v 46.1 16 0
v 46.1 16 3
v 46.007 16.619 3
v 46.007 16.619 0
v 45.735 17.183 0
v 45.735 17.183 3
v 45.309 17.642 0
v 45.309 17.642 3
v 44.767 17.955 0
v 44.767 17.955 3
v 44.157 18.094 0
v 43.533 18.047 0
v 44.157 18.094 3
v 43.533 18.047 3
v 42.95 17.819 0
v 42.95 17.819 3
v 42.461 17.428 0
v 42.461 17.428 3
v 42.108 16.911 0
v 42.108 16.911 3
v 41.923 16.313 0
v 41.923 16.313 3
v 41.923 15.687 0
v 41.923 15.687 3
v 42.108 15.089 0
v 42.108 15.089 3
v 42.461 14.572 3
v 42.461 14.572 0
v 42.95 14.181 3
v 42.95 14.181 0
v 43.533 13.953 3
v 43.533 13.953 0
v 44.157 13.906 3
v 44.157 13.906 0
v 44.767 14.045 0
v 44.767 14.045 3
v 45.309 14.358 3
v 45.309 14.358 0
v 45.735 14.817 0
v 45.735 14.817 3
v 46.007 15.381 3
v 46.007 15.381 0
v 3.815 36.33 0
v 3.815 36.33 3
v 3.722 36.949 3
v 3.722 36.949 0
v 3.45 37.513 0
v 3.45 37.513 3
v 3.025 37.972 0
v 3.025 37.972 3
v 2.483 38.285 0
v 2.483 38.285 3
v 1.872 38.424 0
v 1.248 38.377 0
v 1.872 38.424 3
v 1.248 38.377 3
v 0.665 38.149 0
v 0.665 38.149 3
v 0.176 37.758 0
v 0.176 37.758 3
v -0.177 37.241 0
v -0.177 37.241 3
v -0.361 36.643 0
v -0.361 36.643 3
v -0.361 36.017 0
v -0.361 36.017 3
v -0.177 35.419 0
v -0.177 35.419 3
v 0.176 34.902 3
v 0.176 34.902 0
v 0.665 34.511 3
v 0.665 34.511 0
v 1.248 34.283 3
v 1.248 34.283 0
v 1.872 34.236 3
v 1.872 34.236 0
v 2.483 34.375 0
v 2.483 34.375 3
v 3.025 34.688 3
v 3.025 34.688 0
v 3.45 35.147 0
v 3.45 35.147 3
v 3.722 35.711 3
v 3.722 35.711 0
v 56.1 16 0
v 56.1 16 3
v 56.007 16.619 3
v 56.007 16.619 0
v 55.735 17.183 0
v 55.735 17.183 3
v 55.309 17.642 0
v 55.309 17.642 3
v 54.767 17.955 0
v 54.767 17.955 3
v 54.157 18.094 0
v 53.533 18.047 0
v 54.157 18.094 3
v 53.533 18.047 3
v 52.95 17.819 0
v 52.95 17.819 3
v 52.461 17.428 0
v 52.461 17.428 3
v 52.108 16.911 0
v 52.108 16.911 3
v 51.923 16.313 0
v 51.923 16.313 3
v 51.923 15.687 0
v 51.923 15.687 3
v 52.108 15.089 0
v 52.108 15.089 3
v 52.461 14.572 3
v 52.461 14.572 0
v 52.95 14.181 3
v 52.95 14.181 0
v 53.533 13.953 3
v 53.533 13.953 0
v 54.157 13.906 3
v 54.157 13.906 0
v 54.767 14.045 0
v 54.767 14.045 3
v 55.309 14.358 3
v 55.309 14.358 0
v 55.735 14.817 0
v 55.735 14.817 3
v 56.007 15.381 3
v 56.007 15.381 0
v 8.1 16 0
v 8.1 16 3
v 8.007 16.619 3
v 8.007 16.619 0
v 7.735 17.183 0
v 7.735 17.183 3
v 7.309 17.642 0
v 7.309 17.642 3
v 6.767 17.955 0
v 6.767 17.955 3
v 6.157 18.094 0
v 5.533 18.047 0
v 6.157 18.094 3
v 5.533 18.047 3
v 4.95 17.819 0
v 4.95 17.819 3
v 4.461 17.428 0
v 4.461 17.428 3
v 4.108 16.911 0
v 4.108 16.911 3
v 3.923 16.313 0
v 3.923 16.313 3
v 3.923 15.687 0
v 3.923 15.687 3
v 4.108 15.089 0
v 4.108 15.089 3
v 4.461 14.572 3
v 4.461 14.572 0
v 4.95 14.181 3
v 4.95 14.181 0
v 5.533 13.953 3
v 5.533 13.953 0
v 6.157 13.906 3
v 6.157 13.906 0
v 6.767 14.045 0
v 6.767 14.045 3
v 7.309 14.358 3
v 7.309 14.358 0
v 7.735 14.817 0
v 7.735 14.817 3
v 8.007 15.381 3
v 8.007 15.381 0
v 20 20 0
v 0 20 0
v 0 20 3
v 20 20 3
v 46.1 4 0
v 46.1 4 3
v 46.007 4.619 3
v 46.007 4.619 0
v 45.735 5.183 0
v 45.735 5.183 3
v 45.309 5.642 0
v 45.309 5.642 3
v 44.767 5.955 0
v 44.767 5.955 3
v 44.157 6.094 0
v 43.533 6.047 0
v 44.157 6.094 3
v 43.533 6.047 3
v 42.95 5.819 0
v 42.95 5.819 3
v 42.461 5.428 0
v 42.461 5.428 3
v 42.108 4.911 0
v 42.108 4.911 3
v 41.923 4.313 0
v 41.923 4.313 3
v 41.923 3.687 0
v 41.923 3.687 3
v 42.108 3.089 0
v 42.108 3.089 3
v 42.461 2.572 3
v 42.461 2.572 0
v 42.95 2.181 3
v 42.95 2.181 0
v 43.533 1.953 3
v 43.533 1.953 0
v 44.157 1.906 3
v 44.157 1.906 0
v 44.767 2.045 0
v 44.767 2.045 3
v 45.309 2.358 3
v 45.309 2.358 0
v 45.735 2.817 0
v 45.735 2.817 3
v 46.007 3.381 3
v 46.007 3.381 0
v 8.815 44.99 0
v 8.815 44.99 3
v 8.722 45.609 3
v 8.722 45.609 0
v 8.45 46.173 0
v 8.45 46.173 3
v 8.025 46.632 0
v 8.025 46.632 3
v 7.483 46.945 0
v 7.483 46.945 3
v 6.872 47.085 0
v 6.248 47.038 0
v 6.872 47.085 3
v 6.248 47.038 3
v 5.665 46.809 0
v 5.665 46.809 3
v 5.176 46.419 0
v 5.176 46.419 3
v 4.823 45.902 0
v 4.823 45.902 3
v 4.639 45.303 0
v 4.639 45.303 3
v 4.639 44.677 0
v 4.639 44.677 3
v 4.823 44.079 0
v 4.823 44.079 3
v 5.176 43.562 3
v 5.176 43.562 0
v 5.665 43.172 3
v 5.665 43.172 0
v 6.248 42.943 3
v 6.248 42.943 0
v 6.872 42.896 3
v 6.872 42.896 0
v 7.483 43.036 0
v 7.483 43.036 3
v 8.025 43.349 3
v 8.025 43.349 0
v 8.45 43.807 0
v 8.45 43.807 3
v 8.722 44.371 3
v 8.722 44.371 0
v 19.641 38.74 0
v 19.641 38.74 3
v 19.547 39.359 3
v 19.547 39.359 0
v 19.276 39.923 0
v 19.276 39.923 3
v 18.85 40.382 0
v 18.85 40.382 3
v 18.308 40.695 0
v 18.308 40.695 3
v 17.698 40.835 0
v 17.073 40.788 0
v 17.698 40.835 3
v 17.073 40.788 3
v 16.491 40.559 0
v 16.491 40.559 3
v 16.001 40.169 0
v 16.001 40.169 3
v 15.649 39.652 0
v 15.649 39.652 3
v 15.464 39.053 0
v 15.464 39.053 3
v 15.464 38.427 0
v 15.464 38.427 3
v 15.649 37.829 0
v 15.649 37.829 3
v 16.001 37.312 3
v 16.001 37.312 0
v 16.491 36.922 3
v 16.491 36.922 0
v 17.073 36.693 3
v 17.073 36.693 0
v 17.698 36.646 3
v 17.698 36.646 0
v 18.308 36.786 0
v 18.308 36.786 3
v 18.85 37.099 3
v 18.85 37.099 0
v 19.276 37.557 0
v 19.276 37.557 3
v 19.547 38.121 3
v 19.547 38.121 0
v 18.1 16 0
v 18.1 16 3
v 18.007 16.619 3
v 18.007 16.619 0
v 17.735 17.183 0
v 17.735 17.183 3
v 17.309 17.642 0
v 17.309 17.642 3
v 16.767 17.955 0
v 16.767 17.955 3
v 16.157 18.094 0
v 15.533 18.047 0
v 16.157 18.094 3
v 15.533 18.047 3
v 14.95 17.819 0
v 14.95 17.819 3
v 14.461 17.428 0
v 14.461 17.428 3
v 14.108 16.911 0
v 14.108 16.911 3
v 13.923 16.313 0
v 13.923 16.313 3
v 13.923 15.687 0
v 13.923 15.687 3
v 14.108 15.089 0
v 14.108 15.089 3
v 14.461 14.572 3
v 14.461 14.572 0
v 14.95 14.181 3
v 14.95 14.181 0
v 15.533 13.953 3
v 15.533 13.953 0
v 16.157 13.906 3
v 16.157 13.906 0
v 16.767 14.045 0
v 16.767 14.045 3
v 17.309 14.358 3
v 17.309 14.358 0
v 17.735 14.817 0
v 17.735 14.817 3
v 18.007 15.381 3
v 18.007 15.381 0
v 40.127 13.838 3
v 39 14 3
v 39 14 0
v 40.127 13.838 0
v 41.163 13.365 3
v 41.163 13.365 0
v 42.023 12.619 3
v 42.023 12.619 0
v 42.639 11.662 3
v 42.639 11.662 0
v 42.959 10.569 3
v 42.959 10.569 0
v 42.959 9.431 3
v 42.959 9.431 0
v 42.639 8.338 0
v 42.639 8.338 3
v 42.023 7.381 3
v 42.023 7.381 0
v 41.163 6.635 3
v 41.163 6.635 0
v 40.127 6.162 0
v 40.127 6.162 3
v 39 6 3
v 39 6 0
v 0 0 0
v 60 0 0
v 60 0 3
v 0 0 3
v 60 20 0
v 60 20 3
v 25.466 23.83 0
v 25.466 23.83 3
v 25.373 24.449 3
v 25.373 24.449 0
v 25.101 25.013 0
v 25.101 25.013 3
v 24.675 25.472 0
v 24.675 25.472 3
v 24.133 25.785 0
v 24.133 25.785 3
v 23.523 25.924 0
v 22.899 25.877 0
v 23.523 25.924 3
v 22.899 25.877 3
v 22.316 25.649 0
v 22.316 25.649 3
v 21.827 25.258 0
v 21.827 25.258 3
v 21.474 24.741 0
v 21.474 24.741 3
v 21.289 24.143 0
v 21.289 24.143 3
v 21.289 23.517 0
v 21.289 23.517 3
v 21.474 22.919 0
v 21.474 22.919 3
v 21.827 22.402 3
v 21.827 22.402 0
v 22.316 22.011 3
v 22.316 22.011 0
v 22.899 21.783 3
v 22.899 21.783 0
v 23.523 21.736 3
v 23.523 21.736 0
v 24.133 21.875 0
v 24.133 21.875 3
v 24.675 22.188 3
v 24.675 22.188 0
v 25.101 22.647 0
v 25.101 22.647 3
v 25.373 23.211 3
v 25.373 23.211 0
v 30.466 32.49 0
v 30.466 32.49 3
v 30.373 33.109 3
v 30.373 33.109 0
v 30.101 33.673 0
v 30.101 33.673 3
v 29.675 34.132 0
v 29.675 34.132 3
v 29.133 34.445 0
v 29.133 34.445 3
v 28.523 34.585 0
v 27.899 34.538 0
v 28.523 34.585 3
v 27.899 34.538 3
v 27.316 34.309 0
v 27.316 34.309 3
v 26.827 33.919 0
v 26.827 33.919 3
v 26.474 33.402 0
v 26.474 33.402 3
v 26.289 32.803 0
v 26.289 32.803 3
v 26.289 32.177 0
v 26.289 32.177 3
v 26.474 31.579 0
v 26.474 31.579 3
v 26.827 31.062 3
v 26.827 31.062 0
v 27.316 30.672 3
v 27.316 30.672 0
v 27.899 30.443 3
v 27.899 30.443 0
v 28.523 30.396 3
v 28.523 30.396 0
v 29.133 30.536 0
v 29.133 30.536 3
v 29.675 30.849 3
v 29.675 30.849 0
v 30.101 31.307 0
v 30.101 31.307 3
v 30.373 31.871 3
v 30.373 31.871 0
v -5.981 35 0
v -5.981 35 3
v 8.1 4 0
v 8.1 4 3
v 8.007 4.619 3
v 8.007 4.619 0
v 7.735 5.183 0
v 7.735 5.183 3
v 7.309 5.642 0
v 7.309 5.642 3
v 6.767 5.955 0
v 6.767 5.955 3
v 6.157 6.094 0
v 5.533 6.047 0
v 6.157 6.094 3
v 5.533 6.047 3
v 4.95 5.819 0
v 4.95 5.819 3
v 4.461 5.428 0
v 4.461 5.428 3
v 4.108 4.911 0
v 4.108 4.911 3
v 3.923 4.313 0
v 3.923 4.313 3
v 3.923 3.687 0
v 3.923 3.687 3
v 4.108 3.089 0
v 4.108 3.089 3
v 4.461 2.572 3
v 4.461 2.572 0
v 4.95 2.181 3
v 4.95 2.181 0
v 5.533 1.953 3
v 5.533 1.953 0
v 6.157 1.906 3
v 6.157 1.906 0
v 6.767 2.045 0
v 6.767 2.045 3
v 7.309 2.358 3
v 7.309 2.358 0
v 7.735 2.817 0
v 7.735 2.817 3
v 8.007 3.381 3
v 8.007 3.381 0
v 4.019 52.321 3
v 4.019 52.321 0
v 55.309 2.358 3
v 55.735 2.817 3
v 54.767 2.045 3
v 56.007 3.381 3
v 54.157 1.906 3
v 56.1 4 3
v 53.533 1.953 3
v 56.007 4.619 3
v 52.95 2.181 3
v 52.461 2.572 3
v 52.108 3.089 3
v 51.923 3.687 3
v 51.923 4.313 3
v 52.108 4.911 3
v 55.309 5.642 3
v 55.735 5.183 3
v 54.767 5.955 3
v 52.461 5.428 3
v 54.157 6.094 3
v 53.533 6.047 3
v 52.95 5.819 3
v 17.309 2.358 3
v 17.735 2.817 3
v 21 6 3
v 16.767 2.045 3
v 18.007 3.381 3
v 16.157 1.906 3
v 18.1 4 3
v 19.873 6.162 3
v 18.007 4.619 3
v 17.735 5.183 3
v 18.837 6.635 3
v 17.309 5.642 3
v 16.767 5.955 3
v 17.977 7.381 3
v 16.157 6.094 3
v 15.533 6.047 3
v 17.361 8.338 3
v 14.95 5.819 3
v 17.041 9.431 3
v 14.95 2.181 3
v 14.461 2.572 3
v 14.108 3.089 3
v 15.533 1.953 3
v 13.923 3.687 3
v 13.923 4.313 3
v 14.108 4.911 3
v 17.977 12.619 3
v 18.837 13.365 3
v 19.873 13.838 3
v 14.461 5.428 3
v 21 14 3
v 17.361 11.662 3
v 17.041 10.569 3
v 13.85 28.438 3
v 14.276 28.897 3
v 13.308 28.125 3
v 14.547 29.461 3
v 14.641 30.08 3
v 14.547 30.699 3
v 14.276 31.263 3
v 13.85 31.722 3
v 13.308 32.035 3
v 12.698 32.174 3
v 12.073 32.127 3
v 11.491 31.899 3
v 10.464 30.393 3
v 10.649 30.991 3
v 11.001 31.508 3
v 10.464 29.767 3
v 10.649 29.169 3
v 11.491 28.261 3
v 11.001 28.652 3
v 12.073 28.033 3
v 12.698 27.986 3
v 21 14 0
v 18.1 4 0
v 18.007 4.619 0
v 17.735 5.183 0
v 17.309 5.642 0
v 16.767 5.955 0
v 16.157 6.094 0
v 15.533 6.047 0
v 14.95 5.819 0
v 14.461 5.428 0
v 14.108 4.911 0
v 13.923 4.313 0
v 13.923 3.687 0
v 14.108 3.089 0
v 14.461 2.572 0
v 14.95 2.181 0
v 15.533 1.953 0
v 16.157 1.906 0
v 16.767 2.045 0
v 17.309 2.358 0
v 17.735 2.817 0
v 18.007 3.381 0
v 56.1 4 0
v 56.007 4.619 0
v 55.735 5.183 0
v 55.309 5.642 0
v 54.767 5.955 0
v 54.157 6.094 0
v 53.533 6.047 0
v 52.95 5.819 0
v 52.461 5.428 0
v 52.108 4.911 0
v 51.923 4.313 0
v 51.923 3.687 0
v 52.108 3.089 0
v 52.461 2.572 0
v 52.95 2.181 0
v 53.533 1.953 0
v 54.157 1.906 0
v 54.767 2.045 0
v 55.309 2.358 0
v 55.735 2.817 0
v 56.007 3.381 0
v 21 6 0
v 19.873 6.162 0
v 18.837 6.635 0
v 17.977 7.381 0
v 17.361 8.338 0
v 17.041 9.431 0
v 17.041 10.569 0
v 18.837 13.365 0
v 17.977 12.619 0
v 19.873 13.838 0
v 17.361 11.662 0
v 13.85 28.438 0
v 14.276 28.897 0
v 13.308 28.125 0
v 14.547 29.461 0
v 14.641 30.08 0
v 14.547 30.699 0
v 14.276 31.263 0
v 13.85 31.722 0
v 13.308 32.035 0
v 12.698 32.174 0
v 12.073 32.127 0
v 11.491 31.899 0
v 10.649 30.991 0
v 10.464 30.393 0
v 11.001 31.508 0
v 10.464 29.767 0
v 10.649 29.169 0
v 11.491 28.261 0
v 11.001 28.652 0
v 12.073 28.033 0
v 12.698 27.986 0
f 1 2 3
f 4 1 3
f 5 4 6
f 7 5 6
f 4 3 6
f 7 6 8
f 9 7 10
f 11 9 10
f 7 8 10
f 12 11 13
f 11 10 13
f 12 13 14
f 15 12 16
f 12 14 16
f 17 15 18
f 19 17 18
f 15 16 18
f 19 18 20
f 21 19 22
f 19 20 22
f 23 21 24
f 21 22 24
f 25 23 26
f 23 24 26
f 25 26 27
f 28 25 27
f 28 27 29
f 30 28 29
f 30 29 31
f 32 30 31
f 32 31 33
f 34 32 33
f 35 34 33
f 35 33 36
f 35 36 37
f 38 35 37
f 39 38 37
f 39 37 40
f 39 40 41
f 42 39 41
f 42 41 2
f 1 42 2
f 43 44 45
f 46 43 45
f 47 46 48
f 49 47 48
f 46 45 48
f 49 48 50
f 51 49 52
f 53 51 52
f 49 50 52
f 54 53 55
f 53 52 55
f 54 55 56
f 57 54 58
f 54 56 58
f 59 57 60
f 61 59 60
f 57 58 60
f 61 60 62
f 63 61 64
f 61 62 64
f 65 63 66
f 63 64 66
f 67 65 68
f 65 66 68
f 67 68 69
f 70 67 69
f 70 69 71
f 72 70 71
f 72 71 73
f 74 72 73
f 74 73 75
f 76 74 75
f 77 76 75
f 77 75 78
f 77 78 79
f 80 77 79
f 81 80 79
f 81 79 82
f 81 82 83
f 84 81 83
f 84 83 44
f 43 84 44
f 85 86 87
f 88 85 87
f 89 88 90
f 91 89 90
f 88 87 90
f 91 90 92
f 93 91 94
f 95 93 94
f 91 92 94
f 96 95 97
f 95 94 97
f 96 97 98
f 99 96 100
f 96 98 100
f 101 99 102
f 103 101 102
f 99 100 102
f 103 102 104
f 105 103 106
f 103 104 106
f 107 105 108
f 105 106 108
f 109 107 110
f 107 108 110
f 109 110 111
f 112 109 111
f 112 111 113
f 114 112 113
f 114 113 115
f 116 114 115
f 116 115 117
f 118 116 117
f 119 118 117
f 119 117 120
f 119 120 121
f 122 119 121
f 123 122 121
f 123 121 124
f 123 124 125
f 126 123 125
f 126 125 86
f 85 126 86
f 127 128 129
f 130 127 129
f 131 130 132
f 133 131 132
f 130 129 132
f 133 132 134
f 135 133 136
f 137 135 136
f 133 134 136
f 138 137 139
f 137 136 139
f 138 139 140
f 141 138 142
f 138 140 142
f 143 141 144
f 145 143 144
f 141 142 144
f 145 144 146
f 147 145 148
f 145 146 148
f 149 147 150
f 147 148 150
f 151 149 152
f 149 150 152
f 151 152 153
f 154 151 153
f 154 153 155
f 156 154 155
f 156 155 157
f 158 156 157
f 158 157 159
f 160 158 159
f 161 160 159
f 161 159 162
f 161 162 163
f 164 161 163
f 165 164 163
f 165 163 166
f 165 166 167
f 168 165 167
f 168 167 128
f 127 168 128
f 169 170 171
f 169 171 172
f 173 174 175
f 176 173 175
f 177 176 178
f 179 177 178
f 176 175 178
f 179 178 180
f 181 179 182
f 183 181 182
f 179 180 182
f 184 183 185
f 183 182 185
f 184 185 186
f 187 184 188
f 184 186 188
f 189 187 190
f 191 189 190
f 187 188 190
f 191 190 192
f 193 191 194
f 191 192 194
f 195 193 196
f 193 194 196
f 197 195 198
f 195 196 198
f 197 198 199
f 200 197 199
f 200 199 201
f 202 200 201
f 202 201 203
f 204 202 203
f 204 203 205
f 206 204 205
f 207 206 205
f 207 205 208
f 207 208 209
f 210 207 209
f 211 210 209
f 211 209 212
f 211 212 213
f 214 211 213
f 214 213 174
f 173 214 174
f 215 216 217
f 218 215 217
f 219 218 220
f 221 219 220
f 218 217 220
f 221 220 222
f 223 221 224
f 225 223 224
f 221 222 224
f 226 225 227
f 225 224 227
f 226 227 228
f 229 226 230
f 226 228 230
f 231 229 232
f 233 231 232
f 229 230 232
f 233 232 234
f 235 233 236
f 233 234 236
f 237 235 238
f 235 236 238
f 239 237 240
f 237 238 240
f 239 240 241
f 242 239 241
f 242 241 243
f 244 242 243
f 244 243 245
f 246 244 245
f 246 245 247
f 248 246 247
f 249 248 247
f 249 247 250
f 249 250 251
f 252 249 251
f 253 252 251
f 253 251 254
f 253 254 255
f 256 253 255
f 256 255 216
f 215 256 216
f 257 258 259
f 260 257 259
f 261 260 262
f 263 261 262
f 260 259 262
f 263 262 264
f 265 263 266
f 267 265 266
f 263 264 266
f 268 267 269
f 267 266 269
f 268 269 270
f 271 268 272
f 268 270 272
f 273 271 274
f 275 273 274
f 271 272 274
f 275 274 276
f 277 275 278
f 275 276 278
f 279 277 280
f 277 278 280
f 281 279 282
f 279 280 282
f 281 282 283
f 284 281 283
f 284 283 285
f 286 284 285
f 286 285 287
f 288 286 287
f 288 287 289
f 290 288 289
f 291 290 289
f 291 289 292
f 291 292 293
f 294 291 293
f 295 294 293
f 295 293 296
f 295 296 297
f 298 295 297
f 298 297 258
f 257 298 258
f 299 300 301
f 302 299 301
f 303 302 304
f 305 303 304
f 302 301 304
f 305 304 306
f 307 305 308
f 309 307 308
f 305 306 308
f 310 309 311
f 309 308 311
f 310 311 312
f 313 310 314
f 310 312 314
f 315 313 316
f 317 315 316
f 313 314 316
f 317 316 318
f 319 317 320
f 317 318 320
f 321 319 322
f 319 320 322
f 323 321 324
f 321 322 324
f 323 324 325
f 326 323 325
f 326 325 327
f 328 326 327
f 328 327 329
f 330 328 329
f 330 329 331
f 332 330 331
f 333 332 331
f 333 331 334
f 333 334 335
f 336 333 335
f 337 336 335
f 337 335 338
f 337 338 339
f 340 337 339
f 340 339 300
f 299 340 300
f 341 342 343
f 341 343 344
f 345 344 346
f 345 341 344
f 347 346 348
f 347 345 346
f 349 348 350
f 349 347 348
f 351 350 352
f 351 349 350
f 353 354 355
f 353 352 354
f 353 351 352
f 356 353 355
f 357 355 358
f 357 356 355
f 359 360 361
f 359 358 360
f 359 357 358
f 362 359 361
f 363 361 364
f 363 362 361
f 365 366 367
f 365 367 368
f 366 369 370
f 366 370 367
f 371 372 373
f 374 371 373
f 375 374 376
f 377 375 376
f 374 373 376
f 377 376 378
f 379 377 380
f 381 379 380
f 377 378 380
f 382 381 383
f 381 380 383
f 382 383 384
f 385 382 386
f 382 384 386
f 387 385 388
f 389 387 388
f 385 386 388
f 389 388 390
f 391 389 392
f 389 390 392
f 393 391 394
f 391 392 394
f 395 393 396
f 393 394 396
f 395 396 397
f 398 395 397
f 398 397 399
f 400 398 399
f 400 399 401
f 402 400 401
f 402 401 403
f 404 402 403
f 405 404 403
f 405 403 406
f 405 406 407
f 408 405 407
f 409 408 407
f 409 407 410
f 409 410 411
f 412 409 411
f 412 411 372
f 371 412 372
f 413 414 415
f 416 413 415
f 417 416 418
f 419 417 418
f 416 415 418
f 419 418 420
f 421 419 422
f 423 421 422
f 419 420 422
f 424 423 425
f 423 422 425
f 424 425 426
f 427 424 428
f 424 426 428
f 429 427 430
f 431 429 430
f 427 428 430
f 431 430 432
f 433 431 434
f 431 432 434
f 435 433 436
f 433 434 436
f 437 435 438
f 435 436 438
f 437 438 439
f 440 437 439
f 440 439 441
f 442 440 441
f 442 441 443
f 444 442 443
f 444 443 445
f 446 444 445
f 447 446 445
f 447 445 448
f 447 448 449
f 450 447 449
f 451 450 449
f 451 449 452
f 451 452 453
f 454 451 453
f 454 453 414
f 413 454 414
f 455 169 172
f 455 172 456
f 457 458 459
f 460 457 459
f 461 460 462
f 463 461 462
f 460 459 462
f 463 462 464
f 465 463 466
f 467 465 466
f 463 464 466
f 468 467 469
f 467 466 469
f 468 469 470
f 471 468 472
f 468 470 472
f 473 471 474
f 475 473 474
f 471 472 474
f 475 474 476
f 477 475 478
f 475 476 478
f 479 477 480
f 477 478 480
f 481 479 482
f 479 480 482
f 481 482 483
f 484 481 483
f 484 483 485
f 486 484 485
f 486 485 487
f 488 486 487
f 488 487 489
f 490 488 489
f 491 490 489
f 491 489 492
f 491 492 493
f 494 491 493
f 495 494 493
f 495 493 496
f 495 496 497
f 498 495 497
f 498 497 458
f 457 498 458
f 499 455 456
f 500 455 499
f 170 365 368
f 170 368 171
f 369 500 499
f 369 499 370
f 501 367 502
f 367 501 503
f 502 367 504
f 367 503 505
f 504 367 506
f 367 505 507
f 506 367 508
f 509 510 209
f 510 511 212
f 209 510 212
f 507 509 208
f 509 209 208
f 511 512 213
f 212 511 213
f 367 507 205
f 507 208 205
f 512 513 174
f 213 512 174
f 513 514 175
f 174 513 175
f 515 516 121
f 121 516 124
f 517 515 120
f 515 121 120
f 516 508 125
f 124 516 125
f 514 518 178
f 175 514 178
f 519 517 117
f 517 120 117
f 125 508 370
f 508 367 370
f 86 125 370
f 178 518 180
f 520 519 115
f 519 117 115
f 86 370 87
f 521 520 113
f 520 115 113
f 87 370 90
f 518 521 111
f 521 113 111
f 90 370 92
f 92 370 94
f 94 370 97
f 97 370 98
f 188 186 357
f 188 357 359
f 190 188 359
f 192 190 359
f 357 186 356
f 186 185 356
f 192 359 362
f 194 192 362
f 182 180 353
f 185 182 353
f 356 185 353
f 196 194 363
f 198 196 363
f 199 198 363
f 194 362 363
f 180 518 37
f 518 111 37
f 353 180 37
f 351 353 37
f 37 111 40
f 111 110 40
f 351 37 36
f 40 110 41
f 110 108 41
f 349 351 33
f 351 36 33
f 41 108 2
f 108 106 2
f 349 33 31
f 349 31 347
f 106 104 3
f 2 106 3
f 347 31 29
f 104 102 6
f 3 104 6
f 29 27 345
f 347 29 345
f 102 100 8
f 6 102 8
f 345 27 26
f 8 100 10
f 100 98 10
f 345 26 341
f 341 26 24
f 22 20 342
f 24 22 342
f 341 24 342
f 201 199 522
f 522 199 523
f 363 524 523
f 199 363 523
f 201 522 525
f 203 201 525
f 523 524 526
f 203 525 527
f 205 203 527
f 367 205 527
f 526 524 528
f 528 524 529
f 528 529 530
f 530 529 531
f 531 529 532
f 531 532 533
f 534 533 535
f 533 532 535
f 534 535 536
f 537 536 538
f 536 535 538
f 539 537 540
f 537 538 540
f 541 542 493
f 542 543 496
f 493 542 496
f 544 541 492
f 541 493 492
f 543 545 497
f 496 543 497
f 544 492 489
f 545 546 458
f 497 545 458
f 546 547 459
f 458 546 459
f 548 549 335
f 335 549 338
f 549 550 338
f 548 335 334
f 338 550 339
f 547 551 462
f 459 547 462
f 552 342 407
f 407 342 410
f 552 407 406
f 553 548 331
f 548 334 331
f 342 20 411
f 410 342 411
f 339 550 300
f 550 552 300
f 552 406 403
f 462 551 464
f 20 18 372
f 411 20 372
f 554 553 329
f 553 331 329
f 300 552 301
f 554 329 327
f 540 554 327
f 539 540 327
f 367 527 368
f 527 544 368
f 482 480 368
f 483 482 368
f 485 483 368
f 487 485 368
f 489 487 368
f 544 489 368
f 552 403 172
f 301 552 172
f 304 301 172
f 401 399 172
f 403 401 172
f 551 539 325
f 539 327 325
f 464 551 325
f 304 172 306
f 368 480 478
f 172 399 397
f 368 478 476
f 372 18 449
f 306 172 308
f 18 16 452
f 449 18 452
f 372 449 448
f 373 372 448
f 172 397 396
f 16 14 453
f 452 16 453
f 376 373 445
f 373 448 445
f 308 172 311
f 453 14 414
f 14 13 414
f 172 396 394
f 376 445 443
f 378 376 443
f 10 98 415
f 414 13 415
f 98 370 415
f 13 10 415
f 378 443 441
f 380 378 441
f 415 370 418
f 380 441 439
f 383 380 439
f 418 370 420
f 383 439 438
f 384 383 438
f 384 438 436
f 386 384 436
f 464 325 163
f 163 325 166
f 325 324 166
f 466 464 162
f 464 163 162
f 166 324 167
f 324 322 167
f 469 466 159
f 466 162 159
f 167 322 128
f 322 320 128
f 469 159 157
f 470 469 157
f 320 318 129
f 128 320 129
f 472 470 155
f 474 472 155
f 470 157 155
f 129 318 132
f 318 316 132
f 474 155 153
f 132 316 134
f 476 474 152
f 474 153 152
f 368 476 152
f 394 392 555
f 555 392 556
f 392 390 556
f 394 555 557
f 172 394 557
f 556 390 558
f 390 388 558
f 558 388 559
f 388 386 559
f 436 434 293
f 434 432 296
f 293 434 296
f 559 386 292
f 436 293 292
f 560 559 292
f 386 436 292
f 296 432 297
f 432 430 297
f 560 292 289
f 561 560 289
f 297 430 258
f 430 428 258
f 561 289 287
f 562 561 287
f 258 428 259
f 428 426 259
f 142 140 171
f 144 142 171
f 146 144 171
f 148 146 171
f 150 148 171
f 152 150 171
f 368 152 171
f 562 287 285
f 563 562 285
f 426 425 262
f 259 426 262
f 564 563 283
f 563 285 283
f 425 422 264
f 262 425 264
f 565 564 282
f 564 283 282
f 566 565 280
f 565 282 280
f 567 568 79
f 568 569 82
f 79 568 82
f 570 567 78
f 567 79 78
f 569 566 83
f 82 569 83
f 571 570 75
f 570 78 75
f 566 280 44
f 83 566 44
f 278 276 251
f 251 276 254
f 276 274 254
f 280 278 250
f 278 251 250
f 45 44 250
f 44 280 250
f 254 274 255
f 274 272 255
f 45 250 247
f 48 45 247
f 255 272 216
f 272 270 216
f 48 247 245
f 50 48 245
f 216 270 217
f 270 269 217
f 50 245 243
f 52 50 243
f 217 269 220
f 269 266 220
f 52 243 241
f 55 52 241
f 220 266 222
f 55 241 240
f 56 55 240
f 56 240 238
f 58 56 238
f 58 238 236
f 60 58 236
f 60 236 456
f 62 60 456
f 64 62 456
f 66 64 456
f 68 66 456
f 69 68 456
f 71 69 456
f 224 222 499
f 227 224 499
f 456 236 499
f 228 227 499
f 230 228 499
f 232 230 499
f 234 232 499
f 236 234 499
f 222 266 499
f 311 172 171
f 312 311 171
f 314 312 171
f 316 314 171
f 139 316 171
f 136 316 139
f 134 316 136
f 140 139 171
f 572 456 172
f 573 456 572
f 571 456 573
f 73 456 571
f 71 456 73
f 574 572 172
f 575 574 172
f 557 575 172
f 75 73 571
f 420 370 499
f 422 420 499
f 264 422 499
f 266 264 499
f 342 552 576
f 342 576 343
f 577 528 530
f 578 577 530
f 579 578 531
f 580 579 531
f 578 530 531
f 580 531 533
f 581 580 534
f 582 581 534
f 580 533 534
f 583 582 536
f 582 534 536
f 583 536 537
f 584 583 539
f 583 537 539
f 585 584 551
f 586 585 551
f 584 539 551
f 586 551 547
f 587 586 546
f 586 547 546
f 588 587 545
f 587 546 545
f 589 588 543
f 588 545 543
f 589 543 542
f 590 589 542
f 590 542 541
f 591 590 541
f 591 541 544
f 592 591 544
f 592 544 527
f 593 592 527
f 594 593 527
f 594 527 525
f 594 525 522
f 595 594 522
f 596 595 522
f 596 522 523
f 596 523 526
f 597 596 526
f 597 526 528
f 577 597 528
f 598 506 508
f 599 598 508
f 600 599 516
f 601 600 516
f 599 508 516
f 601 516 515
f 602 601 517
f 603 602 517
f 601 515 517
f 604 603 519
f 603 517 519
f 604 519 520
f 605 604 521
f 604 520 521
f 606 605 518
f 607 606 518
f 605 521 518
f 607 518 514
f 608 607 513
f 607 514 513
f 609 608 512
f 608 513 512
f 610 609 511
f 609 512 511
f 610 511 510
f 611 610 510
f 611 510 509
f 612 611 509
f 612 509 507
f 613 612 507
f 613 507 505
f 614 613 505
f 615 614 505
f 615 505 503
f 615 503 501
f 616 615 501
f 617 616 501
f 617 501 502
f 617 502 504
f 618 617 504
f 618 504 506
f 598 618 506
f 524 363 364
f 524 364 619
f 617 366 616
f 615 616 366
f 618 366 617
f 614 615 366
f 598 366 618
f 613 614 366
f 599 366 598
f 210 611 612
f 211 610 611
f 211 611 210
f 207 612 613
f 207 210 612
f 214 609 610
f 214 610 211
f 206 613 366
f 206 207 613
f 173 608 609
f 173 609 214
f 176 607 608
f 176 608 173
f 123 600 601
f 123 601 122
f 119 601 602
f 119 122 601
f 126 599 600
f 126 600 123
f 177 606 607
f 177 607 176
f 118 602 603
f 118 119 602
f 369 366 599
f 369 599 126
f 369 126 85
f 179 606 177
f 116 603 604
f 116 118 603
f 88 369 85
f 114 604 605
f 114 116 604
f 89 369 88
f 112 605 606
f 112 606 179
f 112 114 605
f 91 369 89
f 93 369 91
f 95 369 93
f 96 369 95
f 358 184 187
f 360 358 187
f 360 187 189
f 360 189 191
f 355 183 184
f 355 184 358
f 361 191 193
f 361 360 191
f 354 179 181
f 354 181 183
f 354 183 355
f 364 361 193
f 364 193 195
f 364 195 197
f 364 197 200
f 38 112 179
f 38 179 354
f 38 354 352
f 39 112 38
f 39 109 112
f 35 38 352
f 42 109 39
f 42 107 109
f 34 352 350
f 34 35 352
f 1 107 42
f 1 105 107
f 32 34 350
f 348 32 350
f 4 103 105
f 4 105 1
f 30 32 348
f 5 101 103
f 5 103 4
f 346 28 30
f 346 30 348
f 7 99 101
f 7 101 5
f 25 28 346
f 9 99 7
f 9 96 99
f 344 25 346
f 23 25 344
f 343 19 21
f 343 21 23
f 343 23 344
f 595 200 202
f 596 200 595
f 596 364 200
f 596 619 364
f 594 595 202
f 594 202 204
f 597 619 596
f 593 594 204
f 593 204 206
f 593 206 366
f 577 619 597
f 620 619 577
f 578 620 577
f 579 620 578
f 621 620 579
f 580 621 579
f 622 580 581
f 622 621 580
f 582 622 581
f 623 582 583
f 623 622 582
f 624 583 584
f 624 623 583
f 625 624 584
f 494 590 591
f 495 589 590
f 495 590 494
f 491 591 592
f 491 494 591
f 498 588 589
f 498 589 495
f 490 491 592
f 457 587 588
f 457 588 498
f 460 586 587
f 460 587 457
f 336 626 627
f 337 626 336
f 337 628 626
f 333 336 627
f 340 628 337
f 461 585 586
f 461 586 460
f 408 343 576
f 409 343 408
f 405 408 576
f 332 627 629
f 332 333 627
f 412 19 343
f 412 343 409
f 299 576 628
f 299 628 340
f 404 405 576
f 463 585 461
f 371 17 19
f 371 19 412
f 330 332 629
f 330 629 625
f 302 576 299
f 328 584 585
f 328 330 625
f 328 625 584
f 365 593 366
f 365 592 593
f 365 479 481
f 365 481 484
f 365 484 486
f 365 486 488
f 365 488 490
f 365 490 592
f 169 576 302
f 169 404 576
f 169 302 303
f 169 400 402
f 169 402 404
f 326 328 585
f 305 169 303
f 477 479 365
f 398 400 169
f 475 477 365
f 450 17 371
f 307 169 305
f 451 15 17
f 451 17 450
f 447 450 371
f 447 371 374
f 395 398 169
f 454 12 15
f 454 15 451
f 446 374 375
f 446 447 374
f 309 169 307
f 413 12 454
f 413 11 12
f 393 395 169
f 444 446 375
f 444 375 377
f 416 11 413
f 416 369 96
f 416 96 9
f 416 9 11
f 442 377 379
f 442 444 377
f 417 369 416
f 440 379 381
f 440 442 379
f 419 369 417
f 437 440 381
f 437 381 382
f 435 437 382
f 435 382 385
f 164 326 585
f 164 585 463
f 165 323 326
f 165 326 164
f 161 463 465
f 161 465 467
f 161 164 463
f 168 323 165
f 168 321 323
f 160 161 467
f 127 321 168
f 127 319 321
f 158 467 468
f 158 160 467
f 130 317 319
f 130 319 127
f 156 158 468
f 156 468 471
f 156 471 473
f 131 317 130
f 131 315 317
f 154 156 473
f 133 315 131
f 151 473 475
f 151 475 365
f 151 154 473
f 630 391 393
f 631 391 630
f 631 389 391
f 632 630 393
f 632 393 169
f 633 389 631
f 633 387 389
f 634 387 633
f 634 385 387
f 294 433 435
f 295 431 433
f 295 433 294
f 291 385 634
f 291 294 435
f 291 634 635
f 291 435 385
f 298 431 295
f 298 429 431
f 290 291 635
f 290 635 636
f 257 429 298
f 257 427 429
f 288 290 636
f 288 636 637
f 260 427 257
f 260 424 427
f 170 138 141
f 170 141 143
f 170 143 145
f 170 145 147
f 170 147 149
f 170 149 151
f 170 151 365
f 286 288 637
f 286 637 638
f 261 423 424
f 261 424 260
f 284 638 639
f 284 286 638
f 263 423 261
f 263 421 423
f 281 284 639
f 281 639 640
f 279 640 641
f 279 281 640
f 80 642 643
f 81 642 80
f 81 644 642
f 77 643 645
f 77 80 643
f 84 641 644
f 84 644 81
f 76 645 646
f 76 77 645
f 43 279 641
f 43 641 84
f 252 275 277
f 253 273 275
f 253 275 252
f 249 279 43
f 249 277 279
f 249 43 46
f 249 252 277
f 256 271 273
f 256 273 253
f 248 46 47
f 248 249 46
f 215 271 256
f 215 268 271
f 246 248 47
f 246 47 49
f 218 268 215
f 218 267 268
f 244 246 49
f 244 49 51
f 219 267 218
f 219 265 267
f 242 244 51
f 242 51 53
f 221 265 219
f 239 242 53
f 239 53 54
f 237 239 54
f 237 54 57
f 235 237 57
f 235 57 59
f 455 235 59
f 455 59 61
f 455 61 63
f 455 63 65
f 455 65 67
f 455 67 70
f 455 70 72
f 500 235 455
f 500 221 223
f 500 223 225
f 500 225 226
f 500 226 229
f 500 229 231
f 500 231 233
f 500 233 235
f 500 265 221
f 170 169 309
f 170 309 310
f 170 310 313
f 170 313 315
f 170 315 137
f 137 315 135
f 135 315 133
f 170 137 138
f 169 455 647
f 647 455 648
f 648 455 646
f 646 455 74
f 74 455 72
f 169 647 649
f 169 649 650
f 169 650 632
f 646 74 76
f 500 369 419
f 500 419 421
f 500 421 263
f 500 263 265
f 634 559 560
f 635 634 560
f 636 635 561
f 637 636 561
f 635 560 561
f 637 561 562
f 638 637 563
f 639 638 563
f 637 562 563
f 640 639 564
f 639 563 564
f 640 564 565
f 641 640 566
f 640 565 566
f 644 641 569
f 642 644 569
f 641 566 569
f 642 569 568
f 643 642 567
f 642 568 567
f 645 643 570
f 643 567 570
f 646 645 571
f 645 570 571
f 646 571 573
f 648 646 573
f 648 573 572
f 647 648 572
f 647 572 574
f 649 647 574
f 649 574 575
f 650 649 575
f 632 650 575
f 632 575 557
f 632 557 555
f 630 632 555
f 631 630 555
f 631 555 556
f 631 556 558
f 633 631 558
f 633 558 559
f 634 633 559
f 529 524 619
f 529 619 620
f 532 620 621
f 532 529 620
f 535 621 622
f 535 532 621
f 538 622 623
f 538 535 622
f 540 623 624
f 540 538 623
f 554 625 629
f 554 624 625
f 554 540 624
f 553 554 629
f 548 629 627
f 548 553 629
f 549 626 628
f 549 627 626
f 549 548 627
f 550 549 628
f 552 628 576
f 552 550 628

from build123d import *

# Parameters (mm, degrees)
EXTRUDE_1_DEPTH     = 3
SKETCH_2_R          = 2.1
CUT_EXTRUDE_1_DEPTH = 10


with BuildPart() as part:
    # 草图1 → 凸台-拉伸1 (new body)
    with BuildSketch(Plane.XY):
        Polygon((60, 0), (0, 0), (0, 20), (20, 20), (-5.980762114, 35), (4.019237886, 52.320508076), (60, 20), align=None)
    extrude(amount=EXTRUDE_1_DEPTH)

    # 草图2 → 切除-拉伸1 (cut)
    with BuildSketch(Plane.XY.offset(3)):
        with Locations((6.715390309, 44.990381057)):
            Circle(SKETCH_2_R)
        with Locations((1.715390309, 36.330127019)):
            Circle(SKETCH_2_R)
        with Locations((17.540707856, 38.740381057)):
            Circle(SKETCH_2_R)
        with Locations((12.540707856, 30.080127019)):
            Circle(SKETCH_2_R)
        with Locations((23.366025404, 23.830127019)):
            Circle(SKETCH_2_R)
        with Locations((28.366025404, 32.490381057)):
            Circle(SKETCH_2_R)
        with Locations((6, 16)):
            Circle(SKETCH_2_R)
        with Locations((6, 4)):
            Circle(SKETCH_2_R)
        with Locations((54, 16)):
            Circle(SKETCH_2_R)
        with Locations((54, 4)):
            Circle(SKETCH_2_R)
        with Locations((16, 16)):
            Circle(SKETCH_2_R)
        with Locations((16, 4)):
            Circle(SKETCH_2_R)
        with Locations((44, 16)):
            Circle(SKETCH_2_R)
        with Locations((44, 4)):
            Circle(SKETCH_2_R)
        with BuildLine():
            Line((21, 14), (39, 14))
            ThreePointArc((39, 14), (43, 10), (39, 6))
            Line((39, 6), (21, 6))
            ThreePointArc((21, 6), (17, 10), (21, 14))
        make_face()
    extrude(amount=-CUT_EXTRUDE_1_DEPTH, mode=Mode.SUBTRACT)


solid = part.part
